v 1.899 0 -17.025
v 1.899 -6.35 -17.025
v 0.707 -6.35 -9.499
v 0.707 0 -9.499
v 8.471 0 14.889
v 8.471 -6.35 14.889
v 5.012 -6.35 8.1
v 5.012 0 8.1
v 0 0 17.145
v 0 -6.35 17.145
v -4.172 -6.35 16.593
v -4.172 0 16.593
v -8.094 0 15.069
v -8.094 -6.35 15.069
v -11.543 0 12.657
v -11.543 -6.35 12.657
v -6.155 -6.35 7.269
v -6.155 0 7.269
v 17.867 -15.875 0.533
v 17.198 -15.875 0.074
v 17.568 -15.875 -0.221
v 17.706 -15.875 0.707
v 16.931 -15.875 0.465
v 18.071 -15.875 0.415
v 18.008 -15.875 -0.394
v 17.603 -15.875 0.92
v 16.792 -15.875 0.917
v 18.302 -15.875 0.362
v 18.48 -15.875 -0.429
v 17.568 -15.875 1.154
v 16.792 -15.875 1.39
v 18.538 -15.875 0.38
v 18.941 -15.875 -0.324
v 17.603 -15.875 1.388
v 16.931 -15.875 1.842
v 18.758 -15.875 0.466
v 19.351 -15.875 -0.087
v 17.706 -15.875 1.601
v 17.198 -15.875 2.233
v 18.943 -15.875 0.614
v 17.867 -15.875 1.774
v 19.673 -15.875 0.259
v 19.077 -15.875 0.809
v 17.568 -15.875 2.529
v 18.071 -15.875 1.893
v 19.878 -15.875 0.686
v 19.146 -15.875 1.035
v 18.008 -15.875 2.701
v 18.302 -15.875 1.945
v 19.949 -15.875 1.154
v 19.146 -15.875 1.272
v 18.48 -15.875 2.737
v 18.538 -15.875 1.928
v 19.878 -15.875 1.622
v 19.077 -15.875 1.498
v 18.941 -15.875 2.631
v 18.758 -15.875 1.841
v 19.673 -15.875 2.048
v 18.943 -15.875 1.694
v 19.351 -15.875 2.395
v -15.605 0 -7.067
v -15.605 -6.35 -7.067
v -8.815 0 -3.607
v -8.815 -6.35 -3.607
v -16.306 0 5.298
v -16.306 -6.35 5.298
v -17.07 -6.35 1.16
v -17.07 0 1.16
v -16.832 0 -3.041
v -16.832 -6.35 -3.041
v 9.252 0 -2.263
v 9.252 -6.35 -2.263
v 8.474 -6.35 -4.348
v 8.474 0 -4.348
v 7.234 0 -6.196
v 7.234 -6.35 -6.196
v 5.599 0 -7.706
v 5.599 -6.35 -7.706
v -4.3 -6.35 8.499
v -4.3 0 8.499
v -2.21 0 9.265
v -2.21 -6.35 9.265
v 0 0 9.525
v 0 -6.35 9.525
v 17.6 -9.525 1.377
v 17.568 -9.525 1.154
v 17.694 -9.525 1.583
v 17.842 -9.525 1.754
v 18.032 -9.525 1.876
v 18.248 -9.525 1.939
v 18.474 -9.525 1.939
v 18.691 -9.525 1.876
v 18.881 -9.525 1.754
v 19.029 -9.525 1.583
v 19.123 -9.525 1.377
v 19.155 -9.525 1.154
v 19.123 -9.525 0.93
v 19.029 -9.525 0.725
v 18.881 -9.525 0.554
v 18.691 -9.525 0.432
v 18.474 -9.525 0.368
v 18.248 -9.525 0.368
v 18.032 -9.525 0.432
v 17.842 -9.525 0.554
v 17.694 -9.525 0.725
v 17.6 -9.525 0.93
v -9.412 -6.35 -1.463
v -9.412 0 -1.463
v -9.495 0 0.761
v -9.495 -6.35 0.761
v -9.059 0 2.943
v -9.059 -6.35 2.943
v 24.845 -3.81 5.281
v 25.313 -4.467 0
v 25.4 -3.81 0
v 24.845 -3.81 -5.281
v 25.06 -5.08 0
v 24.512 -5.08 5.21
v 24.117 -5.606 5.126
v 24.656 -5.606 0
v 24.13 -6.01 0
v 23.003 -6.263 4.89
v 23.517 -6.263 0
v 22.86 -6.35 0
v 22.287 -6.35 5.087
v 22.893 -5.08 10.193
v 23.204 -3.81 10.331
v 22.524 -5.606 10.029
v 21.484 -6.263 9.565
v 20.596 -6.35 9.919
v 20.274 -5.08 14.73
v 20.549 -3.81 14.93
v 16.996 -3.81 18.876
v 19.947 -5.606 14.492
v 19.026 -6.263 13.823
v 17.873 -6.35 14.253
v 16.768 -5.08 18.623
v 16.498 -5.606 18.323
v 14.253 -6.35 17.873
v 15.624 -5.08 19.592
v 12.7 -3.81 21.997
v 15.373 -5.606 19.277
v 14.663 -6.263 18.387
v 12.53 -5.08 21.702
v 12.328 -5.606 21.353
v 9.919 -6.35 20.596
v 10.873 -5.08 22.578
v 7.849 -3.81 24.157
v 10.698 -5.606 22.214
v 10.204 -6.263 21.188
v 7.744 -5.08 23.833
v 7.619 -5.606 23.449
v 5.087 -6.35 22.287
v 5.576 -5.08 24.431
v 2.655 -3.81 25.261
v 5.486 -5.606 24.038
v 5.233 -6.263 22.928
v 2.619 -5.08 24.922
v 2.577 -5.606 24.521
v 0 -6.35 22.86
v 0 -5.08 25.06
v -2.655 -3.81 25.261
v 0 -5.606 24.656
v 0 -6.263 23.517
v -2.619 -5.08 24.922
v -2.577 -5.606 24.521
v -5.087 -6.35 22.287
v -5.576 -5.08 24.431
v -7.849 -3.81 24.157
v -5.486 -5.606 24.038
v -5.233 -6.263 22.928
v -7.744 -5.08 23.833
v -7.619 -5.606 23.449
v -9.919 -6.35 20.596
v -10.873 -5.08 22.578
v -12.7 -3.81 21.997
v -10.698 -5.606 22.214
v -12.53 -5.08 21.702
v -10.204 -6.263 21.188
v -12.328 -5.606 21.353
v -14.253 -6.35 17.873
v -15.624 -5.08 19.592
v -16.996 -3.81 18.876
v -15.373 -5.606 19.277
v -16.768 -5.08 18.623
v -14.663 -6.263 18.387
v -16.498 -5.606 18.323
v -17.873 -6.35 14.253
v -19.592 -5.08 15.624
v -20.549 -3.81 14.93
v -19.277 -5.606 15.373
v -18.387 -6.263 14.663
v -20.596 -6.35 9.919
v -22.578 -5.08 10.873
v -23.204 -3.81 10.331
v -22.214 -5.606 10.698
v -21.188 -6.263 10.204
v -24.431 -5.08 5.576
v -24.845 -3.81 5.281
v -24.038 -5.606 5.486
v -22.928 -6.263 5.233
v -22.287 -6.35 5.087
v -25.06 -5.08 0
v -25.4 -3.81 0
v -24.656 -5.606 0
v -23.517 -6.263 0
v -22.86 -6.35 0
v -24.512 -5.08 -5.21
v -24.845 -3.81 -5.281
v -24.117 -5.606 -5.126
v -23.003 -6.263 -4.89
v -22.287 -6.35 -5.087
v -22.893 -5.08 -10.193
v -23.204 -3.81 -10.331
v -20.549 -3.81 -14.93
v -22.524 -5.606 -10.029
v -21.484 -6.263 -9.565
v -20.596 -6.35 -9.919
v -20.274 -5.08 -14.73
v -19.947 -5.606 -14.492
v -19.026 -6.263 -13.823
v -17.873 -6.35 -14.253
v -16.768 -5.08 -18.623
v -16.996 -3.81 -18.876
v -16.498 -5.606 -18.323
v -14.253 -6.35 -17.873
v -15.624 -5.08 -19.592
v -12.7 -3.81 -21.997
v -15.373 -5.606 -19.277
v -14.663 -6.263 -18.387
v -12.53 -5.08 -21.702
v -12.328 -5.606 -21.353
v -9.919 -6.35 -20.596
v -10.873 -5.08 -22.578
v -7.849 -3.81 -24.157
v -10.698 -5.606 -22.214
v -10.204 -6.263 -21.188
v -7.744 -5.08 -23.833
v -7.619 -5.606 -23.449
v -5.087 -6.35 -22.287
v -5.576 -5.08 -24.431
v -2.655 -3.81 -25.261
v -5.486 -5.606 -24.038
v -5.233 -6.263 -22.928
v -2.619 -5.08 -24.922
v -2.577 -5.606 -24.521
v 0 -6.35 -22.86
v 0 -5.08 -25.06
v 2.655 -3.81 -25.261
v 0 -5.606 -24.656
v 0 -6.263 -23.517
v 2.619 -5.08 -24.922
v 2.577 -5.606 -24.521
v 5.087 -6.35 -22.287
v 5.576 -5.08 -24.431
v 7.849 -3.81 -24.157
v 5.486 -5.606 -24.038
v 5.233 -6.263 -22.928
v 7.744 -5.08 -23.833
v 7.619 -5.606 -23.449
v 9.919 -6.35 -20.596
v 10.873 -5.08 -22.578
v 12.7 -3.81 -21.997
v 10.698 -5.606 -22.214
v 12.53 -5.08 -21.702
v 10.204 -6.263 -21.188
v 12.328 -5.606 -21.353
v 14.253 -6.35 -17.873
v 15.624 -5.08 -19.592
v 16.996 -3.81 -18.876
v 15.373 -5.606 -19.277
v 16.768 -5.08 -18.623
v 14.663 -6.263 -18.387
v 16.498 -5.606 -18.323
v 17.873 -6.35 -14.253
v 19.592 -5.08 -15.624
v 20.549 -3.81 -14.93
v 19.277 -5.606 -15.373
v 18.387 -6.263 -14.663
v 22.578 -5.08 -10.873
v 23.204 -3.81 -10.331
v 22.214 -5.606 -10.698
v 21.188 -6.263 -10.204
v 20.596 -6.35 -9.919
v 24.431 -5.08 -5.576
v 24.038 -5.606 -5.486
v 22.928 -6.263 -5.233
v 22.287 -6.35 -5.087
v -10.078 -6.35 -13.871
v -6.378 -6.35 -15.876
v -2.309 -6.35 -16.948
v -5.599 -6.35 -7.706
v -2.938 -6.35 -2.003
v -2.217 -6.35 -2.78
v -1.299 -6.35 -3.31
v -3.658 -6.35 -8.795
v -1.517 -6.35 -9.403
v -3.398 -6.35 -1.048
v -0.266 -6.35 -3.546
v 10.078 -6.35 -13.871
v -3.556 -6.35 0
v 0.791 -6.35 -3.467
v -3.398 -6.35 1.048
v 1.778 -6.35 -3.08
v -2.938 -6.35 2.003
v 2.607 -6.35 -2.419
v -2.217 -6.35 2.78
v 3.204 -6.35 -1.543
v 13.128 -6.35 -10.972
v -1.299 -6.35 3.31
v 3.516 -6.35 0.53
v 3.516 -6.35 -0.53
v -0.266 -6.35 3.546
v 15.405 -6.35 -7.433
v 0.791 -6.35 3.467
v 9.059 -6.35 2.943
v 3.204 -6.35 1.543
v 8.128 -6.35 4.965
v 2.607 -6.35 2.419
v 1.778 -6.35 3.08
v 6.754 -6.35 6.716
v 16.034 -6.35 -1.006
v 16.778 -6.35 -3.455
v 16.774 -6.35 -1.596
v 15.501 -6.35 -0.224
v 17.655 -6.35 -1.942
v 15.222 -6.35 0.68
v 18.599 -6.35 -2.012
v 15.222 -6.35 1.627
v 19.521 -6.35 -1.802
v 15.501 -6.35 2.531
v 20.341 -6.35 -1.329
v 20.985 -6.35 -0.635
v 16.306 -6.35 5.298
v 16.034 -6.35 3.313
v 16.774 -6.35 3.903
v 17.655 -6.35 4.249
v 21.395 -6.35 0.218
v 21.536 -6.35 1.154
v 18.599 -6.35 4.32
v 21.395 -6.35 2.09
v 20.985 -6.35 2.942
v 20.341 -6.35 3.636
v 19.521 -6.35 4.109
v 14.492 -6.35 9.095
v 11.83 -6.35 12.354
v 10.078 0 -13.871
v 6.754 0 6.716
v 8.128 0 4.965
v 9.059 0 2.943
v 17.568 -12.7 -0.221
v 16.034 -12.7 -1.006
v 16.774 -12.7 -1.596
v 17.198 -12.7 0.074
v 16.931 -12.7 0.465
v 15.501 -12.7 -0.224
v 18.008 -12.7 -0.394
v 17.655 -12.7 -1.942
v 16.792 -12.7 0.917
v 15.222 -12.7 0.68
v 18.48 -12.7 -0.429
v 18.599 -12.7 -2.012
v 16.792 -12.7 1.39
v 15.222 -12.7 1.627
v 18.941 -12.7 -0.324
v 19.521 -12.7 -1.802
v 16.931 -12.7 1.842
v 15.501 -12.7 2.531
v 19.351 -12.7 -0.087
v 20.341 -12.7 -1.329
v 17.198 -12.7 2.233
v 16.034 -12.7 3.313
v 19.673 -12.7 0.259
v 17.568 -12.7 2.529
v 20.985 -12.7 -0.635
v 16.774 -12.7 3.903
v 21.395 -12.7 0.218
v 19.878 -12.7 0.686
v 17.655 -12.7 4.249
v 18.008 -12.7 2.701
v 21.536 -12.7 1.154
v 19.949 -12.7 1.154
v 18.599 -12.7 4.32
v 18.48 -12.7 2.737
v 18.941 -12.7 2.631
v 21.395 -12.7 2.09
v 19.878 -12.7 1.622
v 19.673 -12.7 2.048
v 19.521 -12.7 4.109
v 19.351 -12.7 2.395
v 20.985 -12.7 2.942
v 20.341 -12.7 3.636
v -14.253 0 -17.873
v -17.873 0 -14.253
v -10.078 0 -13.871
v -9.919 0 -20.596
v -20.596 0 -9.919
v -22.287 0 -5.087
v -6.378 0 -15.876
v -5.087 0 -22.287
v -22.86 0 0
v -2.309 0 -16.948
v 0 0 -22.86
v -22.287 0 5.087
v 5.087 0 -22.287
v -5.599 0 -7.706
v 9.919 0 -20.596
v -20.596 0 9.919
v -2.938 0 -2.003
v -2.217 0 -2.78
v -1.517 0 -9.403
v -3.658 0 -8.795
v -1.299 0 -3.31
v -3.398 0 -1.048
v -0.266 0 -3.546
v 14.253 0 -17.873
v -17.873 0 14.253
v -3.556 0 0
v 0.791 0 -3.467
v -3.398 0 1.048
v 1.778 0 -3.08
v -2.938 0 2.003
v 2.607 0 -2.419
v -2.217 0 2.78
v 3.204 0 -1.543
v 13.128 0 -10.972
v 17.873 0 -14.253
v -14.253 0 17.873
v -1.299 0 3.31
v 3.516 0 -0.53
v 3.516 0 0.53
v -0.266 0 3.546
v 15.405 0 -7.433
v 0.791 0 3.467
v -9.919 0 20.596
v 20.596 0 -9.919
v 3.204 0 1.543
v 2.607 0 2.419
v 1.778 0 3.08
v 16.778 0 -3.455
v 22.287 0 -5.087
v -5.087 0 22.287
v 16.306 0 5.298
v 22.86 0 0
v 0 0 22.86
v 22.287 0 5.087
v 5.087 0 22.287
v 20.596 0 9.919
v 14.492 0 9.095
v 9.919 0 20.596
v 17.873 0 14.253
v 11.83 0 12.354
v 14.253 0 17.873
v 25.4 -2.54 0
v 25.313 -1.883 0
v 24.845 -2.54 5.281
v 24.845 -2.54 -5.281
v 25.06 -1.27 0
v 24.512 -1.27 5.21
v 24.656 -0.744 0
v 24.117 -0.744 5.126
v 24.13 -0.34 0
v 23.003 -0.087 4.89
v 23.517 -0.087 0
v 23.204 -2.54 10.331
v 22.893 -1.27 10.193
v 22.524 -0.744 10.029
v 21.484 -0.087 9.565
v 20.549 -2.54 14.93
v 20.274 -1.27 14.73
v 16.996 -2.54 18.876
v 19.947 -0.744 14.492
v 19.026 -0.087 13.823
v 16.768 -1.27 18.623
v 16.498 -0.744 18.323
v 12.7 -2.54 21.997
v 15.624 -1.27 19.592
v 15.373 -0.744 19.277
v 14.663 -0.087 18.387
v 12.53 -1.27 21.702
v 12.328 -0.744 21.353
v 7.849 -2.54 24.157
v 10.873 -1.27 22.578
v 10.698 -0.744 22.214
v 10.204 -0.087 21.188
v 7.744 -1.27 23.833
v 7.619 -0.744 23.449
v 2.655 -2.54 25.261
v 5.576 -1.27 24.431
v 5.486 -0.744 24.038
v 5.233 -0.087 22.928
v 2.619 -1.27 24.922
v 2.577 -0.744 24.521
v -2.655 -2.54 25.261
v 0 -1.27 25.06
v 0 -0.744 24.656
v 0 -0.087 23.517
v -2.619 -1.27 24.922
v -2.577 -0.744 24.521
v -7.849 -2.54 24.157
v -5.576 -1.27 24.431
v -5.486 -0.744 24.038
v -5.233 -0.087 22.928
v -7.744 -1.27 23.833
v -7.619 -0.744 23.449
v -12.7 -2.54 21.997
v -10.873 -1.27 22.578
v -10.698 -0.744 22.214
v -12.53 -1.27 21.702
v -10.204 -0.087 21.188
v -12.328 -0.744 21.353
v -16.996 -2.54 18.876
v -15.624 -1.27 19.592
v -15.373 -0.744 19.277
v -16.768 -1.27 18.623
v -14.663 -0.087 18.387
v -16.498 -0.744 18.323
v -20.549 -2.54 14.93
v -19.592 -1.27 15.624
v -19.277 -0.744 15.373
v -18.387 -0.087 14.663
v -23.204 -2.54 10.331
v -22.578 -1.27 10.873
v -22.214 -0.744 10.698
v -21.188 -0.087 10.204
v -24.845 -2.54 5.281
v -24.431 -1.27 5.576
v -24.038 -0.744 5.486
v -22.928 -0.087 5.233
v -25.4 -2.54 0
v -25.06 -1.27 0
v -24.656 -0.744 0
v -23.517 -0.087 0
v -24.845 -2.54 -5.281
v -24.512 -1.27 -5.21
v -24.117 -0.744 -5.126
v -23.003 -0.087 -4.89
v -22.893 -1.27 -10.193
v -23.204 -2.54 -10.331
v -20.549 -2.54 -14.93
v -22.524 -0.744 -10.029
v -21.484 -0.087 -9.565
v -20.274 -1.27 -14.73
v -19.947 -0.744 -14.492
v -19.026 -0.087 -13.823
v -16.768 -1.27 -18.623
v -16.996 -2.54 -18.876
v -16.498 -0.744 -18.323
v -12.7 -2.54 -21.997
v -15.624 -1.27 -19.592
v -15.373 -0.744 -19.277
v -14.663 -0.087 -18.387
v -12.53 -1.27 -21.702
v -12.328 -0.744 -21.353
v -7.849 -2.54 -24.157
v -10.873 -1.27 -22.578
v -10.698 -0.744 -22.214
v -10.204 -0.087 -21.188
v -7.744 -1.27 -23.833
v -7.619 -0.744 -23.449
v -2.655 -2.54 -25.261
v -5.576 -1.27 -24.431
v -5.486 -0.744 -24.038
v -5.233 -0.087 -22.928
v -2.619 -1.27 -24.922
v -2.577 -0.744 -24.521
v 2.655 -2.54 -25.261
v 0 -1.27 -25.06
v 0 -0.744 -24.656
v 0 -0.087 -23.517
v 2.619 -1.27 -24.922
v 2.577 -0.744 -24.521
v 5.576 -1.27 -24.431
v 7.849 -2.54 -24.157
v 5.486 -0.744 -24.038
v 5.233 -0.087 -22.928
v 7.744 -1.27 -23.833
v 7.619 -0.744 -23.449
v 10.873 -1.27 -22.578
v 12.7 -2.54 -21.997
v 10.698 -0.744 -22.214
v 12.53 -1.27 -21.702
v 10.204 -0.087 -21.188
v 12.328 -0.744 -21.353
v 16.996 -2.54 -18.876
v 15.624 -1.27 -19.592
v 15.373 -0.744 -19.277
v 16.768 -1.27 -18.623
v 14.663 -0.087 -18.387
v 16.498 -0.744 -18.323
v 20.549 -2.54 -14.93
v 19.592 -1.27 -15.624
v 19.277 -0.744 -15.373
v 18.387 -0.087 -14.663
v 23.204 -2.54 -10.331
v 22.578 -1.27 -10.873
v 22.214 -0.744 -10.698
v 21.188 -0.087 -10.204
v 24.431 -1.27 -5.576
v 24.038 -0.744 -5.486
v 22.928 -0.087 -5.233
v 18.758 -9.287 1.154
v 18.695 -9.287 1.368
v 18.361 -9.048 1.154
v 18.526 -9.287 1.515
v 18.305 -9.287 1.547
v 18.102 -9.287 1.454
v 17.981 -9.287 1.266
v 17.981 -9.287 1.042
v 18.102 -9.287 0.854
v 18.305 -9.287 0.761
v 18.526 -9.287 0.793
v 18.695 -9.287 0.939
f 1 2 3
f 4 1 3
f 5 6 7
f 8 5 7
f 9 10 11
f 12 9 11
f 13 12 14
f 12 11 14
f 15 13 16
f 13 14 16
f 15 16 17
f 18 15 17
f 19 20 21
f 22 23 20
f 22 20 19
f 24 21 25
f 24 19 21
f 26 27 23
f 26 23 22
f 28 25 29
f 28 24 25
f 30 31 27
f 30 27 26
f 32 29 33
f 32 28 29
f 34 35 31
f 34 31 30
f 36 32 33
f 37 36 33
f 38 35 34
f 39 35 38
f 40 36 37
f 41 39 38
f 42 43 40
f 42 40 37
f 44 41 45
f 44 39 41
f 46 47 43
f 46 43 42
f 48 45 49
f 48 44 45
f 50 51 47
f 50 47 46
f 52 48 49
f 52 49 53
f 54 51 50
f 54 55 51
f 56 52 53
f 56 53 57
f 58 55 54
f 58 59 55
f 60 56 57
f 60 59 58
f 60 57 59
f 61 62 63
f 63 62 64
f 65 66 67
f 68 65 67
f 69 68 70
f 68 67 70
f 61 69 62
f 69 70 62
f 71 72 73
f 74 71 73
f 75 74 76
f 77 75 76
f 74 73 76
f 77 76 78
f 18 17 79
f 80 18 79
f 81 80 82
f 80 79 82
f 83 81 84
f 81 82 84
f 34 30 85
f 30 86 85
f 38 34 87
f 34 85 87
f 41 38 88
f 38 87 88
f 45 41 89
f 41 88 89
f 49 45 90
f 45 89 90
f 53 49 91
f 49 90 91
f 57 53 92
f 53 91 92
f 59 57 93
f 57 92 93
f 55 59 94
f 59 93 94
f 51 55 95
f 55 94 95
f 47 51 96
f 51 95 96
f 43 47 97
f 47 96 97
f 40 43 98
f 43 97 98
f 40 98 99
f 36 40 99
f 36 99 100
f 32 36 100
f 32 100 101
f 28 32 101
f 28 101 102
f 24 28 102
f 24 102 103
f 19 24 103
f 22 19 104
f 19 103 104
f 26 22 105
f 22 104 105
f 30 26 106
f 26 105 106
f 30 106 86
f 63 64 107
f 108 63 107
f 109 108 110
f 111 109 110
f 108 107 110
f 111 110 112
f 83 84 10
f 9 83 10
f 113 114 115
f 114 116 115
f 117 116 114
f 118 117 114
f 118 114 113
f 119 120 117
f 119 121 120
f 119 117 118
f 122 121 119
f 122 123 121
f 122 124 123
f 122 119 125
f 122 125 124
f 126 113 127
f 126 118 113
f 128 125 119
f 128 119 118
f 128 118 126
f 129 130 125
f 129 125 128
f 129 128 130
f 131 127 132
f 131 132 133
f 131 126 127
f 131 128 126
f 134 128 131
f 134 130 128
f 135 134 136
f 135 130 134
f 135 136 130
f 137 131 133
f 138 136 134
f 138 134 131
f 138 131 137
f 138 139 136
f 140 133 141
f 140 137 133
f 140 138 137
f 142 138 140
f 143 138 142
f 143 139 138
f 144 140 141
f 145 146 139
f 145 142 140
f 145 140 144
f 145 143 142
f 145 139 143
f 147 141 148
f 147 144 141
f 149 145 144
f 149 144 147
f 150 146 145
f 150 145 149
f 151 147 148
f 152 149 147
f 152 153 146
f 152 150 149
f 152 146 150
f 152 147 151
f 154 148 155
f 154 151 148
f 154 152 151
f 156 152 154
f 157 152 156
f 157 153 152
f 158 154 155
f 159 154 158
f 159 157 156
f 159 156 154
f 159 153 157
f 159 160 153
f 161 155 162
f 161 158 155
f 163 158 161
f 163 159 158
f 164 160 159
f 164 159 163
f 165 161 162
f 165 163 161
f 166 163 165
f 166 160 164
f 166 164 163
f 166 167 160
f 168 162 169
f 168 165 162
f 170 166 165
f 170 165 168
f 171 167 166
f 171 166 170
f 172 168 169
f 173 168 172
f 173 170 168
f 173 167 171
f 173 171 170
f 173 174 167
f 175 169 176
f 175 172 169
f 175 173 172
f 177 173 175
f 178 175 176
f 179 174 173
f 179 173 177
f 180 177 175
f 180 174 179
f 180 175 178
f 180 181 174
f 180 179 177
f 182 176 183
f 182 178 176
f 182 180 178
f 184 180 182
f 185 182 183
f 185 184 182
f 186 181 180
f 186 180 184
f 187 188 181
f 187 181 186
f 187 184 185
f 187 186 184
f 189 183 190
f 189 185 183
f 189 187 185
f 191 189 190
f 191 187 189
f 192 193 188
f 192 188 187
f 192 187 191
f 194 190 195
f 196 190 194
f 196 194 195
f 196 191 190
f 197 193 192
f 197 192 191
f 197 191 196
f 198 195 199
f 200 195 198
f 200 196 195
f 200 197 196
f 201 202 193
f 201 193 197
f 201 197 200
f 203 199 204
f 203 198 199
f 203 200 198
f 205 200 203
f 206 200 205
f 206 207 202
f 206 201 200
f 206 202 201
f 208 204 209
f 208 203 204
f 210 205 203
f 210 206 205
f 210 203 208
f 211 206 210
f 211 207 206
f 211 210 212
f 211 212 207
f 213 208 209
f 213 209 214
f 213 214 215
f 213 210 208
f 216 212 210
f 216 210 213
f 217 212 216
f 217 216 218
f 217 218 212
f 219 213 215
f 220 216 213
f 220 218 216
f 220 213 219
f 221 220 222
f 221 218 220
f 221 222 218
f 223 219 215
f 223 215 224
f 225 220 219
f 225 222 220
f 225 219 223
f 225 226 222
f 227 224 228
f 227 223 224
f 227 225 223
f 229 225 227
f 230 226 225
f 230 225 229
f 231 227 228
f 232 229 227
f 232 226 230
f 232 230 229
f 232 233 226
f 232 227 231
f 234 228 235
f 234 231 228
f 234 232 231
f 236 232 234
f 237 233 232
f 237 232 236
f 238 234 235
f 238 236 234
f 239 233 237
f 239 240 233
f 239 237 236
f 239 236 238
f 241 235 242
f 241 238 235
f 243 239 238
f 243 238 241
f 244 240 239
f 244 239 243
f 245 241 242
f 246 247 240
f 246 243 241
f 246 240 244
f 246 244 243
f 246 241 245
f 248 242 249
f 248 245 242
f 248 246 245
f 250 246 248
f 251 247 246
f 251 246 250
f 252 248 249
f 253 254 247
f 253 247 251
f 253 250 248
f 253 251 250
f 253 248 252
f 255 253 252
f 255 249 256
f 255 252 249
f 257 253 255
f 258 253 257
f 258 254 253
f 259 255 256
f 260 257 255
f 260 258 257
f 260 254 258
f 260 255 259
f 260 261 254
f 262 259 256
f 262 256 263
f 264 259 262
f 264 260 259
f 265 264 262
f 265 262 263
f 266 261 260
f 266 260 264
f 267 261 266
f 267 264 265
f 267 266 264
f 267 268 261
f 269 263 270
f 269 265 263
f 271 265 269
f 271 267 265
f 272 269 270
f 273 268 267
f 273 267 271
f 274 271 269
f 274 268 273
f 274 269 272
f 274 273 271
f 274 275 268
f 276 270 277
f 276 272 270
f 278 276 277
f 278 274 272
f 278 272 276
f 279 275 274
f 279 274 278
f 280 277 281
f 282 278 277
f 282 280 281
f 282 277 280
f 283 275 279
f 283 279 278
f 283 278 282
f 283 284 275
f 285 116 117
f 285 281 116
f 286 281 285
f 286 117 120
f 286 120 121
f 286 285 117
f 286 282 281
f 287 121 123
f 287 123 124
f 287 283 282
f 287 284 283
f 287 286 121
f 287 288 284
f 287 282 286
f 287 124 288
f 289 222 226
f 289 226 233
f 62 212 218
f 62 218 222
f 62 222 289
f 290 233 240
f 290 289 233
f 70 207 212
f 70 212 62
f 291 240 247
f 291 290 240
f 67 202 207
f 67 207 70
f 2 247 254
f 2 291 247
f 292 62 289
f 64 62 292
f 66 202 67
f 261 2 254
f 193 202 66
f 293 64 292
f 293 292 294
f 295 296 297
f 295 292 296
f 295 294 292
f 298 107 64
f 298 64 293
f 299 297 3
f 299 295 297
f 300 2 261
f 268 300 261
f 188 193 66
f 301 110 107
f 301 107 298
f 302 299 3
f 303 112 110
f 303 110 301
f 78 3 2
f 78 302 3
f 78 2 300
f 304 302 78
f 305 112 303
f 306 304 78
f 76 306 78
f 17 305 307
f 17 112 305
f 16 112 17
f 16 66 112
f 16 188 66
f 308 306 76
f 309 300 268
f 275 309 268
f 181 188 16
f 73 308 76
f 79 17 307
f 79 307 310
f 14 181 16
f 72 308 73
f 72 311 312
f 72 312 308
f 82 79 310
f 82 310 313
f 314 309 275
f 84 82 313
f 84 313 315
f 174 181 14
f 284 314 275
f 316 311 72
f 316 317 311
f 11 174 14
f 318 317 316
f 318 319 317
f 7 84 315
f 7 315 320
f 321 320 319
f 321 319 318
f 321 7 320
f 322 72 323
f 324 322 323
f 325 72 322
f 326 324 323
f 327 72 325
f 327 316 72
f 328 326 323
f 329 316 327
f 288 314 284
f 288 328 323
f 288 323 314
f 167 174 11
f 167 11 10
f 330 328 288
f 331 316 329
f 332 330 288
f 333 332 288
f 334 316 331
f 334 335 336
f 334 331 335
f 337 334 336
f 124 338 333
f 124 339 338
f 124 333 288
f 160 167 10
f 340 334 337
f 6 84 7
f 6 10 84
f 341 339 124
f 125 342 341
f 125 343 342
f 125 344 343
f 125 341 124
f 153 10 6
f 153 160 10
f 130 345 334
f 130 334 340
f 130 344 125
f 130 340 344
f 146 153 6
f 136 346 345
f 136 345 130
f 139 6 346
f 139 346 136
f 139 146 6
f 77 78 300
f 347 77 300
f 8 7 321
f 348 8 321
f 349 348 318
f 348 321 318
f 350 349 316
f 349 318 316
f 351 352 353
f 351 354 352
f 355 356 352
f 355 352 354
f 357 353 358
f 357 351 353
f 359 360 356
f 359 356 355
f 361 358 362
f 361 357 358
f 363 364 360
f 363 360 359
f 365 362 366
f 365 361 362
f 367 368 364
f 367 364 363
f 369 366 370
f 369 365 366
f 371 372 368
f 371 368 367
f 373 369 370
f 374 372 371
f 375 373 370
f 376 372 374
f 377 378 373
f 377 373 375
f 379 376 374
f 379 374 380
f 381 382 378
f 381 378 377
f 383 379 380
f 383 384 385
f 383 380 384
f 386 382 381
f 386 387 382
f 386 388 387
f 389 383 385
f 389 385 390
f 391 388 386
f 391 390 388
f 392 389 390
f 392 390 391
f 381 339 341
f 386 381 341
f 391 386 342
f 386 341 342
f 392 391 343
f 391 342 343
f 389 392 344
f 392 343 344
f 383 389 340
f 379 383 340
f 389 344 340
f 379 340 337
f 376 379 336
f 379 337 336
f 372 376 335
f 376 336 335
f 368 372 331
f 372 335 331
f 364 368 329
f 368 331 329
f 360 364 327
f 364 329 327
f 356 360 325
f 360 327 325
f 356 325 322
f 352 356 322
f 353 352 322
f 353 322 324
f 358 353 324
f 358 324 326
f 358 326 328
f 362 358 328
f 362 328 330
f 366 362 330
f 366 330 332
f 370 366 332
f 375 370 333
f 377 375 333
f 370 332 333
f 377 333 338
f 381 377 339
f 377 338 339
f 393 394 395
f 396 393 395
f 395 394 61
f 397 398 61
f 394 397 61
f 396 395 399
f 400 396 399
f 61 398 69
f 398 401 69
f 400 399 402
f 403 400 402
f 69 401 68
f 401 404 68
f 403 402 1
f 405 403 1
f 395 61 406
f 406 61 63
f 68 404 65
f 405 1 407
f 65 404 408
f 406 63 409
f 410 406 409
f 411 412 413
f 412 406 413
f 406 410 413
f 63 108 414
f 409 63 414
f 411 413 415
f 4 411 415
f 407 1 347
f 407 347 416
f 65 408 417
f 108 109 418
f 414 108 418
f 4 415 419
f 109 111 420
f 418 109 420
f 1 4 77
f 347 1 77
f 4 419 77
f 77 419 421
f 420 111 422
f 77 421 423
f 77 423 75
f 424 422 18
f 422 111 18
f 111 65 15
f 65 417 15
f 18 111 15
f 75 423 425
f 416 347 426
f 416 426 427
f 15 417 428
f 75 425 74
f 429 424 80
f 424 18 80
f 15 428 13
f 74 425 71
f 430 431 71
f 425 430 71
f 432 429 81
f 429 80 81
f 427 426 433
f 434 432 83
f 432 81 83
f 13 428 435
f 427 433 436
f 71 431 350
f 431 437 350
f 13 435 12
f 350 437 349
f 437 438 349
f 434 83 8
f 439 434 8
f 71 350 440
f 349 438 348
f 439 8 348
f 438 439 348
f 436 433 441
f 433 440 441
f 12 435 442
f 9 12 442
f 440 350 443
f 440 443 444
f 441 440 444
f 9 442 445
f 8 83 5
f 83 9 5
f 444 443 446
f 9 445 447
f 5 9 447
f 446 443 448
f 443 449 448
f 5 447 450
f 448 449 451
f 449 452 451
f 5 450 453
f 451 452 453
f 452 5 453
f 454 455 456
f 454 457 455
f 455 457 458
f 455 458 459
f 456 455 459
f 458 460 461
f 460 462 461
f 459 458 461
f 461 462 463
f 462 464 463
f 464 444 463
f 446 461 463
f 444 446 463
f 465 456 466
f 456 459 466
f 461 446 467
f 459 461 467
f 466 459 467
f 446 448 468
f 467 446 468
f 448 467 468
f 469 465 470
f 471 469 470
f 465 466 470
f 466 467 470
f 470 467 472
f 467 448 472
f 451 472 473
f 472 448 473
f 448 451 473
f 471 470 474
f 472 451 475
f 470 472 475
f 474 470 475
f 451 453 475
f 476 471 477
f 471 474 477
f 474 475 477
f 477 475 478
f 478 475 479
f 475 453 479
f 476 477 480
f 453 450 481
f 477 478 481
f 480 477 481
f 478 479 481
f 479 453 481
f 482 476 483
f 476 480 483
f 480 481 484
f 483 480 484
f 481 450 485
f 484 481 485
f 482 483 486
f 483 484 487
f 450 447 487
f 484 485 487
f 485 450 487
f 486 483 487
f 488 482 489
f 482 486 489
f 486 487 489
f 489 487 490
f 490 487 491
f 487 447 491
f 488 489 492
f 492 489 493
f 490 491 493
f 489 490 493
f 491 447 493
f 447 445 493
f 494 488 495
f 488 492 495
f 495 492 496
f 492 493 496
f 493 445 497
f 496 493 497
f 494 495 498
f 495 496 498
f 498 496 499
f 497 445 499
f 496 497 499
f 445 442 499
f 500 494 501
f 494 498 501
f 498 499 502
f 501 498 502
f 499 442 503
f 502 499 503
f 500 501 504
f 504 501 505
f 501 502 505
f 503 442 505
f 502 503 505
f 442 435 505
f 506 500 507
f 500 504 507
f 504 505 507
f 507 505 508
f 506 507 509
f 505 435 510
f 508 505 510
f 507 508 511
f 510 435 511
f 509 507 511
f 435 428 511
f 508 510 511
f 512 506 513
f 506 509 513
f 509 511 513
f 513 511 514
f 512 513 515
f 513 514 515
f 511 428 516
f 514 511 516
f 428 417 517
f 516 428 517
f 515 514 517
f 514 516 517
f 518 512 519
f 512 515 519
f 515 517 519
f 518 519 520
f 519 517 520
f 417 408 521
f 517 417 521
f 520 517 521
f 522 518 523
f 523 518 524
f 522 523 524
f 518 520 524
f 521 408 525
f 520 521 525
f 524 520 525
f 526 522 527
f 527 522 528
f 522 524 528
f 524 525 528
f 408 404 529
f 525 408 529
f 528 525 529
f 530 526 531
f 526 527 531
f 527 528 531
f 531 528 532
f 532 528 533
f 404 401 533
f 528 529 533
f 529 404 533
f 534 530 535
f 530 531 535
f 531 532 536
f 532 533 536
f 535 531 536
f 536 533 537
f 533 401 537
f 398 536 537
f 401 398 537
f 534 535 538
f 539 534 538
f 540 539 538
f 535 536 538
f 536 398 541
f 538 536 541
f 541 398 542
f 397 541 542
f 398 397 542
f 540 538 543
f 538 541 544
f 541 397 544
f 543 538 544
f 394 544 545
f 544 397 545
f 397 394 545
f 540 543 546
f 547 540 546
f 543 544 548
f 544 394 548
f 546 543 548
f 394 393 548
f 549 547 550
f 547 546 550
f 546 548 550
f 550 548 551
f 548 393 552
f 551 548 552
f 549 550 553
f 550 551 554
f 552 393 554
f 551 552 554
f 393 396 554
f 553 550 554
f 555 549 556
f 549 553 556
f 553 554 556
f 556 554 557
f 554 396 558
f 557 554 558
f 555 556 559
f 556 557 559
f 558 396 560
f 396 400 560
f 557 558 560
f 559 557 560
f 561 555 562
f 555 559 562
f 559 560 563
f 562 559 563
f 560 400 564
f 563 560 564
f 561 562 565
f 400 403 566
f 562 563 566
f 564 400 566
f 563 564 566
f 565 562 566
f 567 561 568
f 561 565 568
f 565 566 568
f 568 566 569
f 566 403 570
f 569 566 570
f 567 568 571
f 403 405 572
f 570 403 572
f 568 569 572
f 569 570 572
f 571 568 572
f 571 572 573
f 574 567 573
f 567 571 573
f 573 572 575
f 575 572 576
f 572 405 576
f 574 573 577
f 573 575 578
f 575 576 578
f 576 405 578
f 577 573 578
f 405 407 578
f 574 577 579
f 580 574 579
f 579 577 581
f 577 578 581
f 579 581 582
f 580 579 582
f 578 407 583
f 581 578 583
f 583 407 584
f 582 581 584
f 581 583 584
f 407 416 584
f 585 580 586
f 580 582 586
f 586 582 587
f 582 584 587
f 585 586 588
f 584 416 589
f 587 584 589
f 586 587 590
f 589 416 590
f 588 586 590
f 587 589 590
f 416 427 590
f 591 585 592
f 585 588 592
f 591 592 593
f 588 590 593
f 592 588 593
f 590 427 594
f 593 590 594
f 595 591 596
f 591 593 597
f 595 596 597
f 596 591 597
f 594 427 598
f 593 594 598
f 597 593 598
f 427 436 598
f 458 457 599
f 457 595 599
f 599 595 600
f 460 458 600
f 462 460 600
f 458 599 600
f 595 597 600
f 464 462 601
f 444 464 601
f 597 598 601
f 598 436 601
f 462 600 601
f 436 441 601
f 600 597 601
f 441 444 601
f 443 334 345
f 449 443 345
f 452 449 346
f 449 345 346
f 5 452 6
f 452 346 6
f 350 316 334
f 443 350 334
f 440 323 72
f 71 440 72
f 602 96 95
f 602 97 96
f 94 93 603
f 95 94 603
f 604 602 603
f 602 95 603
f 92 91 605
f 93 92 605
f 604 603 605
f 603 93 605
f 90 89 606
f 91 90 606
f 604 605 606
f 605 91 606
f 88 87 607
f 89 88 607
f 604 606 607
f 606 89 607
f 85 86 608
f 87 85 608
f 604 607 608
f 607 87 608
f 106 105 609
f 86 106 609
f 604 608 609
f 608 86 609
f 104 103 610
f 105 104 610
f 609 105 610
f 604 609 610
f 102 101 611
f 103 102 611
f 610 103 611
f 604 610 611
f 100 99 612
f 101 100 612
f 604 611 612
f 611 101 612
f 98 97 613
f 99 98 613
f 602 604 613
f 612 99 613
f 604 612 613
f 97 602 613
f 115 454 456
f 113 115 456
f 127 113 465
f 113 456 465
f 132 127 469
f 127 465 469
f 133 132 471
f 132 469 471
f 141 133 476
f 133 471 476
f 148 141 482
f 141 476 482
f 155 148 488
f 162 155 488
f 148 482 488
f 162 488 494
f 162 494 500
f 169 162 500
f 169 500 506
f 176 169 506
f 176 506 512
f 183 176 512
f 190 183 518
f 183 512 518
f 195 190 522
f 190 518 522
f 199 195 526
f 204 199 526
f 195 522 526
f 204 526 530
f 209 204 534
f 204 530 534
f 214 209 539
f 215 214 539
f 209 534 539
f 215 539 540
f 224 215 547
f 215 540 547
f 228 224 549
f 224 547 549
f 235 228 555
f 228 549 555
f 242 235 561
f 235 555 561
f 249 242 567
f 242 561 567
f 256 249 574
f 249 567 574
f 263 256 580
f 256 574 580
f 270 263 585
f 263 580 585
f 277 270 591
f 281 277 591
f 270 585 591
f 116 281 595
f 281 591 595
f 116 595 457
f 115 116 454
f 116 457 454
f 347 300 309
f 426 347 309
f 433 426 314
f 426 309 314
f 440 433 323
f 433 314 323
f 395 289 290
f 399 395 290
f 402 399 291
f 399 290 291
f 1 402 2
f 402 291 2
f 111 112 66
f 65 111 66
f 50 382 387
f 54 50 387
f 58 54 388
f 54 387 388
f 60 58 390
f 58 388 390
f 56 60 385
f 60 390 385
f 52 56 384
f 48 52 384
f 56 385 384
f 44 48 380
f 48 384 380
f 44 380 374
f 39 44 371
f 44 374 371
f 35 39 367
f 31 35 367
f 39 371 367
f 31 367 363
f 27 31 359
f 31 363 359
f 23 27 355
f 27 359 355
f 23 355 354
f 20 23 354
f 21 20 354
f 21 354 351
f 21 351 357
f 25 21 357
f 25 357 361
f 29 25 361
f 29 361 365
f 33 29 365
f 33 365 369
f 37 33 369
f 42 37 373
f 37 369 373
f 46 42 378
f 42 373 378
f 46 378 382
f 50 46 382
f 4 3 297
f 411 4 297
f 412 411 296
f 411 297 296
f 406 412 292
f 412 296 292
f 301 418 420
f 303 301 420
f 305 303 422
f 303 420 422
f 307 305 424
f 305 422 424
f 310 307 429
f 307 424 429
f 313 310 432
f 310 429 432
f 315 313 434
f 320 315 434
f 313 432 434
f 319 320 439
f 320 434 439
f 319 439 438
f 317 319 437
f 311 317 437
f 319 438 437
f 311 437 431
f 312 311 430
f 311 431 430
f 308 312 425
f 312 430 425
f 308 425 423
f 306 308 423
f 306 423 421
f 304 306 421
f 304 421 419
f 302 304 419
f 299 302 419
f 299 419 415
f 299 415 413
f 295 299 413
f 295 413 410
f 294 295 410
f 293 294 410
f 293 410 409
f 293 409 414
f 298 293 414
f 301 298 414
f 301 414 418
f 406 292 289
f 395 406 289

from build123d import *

# Parameters (mm, degrees)
F0_R      = 25.4
F1_DEPTH  = 6.35
F2_R      = 2.54
F4_DEPTH  = 6.35
F6_D      = 7.112
F7_R      = 3.175
F8_DEPTH  = 6.35
F9_R      = 1.5875
F10_DEPTH = 3.175
F12_D     = 1.5875
F12_DEPTH = 6.35
F12_TIP   = 0.4769331164


with BuildPart() as f1:
    # F0 (on Front) → F1 (new body)
    with BuildSketch(Plane.XZ):
        Circle(F0_R)
    extrude(amount=F1_DEPTH)

    # F2
    f2_edges = [f1.edges().sort_by_distance(p)[0] for p in [
        (-25.4, -6.35, 0),
        (-25.4, 0, 0),
    ]]
    fillet(f2_edges, radius=F2_R)

    # F3 (on face) → F4 (cut)
    with BuildSketch(Plane.XZ.offset(6.35)):
        with BuildLine():
            ThreePointArc((-6.1549146928, 7.2692950225), (-3.2776203189, 8.9433120288), (0, 9.525))
            Line((0, 9.525), (0, 17.145))
            ThreePointArc((0, 17.145), (-6.1786433002, 15.9484075566), (-11.5430683654, 12.6574486952))
            Line((-11.5430683654, 12.6574486952), (-6.1549146928, 7.2692950225))
        make_face()
        with BuildLine():
            ThreePointArc((-8.8154836391, -3.6073360267), (-9.5184355619, -0.3535667594), (-9.0588133177, 2.9433868714))
            Line((-9.0588133177, 2.9433868714), (-16.3058639719, 5.2980963686))
            ThreePointArc((-16.3058639719, 5.2980963686), (-17.0771427132, -0.9479100044), (-15.6049533534, -7.0667436347))
            Line((-15.6049533534, -7.0667436347), (-8.8154836391, -3.6073360267))
        make_face()
        with BuildLine():
            Line((1.8986768002, -17.0249364512), (0.7066461766, -9.4987512959))
            ThreePointArc((0.7066461766, -9.4987512959), (-2.6050963781, -9.1618283034), (-5.5986545281, -7.7058868714))
            Line((-5.5986545281, -7.7058868714), (-10.0775781506, -13.8705963686))
            ThreePointArc((-10.0775781506, -13.8705963686), (-4.3756113272, -16.5342481576), (1.8986768002, -17.0249364512))
        make_face()
        with BuildLine():
            Line((16.7784001495, -3.4552457484), (9.2522149942, -2.2632151248))
            ThreePointArc((9.2522149942, -2.2632151248), (7.9083974563, -5.3087545312), (5.5986545281, -7.7058868714))
            Line((5.5986545281, -7.7058868714), (10.0775781506, -13.8705963686))
            ThreePointArc((10.0775781506, -13.8705963686), (14.3728661914, -9.2708173354), (16.7784001495, -3.4552457484))
        make_face()
        with BuildLine():
            ThreePointArc((5.0115371611, 8.1000074249), (7.4927548026, 5.8808375652), (9.0588133177, 2.9433868714))
            Line((9.0588133177, 2.9433868714), (16.3058639719, 5.2980963686))
            ThreePointArc((16.3058639719, 5.2980963686), (13.2585311493, 10.8045679408), (8.4709447691, 14.8894771392))
            Line((8.4709447691, 14.8894771392), (5.0115371611, 8.1000074249))
        make_face()
    extrude(amount=-F4_DEPTH, mode=Mode.SUBTRACT)

    # F6 (through all)
    with Locations(Plane.XZ.offset(6.35)):
        with Locations((0, 0)):
            Hole(F6_D / 2)

    # F7 (on face) → F8 (join)
    with BuildSketch(Plane.XZ.offset(6.35)):
        with Locations((18.3614359412, 1.1536982916)):
            Circle(F7_R)
    extrude(amount=F8_DEPTH)

    # F9 (on face) → F10 (join)
    with BuildSketch(Plane.XZ.offset(12.7)):
        with Locations((18.3614359412, 1.1536982916)):
            Circle(F9_R)
    extrude(amount=F10_DEPTH)

    # F12
    with Locations(Plane.XZ.offset(15.875)):
        with Locations((18.3614359412, 1.1536982916)):
            Hole(F12_D / 2, depth=F12_DEPTH)
            with Locations((0, 0, -(F12_DEPTH + F12_TIP / 2))):  # 118° drill point
                Cone(0, F12_D / 2, F12_TIP, mode=Mode.SUBTRACT)


solid = f1.part
